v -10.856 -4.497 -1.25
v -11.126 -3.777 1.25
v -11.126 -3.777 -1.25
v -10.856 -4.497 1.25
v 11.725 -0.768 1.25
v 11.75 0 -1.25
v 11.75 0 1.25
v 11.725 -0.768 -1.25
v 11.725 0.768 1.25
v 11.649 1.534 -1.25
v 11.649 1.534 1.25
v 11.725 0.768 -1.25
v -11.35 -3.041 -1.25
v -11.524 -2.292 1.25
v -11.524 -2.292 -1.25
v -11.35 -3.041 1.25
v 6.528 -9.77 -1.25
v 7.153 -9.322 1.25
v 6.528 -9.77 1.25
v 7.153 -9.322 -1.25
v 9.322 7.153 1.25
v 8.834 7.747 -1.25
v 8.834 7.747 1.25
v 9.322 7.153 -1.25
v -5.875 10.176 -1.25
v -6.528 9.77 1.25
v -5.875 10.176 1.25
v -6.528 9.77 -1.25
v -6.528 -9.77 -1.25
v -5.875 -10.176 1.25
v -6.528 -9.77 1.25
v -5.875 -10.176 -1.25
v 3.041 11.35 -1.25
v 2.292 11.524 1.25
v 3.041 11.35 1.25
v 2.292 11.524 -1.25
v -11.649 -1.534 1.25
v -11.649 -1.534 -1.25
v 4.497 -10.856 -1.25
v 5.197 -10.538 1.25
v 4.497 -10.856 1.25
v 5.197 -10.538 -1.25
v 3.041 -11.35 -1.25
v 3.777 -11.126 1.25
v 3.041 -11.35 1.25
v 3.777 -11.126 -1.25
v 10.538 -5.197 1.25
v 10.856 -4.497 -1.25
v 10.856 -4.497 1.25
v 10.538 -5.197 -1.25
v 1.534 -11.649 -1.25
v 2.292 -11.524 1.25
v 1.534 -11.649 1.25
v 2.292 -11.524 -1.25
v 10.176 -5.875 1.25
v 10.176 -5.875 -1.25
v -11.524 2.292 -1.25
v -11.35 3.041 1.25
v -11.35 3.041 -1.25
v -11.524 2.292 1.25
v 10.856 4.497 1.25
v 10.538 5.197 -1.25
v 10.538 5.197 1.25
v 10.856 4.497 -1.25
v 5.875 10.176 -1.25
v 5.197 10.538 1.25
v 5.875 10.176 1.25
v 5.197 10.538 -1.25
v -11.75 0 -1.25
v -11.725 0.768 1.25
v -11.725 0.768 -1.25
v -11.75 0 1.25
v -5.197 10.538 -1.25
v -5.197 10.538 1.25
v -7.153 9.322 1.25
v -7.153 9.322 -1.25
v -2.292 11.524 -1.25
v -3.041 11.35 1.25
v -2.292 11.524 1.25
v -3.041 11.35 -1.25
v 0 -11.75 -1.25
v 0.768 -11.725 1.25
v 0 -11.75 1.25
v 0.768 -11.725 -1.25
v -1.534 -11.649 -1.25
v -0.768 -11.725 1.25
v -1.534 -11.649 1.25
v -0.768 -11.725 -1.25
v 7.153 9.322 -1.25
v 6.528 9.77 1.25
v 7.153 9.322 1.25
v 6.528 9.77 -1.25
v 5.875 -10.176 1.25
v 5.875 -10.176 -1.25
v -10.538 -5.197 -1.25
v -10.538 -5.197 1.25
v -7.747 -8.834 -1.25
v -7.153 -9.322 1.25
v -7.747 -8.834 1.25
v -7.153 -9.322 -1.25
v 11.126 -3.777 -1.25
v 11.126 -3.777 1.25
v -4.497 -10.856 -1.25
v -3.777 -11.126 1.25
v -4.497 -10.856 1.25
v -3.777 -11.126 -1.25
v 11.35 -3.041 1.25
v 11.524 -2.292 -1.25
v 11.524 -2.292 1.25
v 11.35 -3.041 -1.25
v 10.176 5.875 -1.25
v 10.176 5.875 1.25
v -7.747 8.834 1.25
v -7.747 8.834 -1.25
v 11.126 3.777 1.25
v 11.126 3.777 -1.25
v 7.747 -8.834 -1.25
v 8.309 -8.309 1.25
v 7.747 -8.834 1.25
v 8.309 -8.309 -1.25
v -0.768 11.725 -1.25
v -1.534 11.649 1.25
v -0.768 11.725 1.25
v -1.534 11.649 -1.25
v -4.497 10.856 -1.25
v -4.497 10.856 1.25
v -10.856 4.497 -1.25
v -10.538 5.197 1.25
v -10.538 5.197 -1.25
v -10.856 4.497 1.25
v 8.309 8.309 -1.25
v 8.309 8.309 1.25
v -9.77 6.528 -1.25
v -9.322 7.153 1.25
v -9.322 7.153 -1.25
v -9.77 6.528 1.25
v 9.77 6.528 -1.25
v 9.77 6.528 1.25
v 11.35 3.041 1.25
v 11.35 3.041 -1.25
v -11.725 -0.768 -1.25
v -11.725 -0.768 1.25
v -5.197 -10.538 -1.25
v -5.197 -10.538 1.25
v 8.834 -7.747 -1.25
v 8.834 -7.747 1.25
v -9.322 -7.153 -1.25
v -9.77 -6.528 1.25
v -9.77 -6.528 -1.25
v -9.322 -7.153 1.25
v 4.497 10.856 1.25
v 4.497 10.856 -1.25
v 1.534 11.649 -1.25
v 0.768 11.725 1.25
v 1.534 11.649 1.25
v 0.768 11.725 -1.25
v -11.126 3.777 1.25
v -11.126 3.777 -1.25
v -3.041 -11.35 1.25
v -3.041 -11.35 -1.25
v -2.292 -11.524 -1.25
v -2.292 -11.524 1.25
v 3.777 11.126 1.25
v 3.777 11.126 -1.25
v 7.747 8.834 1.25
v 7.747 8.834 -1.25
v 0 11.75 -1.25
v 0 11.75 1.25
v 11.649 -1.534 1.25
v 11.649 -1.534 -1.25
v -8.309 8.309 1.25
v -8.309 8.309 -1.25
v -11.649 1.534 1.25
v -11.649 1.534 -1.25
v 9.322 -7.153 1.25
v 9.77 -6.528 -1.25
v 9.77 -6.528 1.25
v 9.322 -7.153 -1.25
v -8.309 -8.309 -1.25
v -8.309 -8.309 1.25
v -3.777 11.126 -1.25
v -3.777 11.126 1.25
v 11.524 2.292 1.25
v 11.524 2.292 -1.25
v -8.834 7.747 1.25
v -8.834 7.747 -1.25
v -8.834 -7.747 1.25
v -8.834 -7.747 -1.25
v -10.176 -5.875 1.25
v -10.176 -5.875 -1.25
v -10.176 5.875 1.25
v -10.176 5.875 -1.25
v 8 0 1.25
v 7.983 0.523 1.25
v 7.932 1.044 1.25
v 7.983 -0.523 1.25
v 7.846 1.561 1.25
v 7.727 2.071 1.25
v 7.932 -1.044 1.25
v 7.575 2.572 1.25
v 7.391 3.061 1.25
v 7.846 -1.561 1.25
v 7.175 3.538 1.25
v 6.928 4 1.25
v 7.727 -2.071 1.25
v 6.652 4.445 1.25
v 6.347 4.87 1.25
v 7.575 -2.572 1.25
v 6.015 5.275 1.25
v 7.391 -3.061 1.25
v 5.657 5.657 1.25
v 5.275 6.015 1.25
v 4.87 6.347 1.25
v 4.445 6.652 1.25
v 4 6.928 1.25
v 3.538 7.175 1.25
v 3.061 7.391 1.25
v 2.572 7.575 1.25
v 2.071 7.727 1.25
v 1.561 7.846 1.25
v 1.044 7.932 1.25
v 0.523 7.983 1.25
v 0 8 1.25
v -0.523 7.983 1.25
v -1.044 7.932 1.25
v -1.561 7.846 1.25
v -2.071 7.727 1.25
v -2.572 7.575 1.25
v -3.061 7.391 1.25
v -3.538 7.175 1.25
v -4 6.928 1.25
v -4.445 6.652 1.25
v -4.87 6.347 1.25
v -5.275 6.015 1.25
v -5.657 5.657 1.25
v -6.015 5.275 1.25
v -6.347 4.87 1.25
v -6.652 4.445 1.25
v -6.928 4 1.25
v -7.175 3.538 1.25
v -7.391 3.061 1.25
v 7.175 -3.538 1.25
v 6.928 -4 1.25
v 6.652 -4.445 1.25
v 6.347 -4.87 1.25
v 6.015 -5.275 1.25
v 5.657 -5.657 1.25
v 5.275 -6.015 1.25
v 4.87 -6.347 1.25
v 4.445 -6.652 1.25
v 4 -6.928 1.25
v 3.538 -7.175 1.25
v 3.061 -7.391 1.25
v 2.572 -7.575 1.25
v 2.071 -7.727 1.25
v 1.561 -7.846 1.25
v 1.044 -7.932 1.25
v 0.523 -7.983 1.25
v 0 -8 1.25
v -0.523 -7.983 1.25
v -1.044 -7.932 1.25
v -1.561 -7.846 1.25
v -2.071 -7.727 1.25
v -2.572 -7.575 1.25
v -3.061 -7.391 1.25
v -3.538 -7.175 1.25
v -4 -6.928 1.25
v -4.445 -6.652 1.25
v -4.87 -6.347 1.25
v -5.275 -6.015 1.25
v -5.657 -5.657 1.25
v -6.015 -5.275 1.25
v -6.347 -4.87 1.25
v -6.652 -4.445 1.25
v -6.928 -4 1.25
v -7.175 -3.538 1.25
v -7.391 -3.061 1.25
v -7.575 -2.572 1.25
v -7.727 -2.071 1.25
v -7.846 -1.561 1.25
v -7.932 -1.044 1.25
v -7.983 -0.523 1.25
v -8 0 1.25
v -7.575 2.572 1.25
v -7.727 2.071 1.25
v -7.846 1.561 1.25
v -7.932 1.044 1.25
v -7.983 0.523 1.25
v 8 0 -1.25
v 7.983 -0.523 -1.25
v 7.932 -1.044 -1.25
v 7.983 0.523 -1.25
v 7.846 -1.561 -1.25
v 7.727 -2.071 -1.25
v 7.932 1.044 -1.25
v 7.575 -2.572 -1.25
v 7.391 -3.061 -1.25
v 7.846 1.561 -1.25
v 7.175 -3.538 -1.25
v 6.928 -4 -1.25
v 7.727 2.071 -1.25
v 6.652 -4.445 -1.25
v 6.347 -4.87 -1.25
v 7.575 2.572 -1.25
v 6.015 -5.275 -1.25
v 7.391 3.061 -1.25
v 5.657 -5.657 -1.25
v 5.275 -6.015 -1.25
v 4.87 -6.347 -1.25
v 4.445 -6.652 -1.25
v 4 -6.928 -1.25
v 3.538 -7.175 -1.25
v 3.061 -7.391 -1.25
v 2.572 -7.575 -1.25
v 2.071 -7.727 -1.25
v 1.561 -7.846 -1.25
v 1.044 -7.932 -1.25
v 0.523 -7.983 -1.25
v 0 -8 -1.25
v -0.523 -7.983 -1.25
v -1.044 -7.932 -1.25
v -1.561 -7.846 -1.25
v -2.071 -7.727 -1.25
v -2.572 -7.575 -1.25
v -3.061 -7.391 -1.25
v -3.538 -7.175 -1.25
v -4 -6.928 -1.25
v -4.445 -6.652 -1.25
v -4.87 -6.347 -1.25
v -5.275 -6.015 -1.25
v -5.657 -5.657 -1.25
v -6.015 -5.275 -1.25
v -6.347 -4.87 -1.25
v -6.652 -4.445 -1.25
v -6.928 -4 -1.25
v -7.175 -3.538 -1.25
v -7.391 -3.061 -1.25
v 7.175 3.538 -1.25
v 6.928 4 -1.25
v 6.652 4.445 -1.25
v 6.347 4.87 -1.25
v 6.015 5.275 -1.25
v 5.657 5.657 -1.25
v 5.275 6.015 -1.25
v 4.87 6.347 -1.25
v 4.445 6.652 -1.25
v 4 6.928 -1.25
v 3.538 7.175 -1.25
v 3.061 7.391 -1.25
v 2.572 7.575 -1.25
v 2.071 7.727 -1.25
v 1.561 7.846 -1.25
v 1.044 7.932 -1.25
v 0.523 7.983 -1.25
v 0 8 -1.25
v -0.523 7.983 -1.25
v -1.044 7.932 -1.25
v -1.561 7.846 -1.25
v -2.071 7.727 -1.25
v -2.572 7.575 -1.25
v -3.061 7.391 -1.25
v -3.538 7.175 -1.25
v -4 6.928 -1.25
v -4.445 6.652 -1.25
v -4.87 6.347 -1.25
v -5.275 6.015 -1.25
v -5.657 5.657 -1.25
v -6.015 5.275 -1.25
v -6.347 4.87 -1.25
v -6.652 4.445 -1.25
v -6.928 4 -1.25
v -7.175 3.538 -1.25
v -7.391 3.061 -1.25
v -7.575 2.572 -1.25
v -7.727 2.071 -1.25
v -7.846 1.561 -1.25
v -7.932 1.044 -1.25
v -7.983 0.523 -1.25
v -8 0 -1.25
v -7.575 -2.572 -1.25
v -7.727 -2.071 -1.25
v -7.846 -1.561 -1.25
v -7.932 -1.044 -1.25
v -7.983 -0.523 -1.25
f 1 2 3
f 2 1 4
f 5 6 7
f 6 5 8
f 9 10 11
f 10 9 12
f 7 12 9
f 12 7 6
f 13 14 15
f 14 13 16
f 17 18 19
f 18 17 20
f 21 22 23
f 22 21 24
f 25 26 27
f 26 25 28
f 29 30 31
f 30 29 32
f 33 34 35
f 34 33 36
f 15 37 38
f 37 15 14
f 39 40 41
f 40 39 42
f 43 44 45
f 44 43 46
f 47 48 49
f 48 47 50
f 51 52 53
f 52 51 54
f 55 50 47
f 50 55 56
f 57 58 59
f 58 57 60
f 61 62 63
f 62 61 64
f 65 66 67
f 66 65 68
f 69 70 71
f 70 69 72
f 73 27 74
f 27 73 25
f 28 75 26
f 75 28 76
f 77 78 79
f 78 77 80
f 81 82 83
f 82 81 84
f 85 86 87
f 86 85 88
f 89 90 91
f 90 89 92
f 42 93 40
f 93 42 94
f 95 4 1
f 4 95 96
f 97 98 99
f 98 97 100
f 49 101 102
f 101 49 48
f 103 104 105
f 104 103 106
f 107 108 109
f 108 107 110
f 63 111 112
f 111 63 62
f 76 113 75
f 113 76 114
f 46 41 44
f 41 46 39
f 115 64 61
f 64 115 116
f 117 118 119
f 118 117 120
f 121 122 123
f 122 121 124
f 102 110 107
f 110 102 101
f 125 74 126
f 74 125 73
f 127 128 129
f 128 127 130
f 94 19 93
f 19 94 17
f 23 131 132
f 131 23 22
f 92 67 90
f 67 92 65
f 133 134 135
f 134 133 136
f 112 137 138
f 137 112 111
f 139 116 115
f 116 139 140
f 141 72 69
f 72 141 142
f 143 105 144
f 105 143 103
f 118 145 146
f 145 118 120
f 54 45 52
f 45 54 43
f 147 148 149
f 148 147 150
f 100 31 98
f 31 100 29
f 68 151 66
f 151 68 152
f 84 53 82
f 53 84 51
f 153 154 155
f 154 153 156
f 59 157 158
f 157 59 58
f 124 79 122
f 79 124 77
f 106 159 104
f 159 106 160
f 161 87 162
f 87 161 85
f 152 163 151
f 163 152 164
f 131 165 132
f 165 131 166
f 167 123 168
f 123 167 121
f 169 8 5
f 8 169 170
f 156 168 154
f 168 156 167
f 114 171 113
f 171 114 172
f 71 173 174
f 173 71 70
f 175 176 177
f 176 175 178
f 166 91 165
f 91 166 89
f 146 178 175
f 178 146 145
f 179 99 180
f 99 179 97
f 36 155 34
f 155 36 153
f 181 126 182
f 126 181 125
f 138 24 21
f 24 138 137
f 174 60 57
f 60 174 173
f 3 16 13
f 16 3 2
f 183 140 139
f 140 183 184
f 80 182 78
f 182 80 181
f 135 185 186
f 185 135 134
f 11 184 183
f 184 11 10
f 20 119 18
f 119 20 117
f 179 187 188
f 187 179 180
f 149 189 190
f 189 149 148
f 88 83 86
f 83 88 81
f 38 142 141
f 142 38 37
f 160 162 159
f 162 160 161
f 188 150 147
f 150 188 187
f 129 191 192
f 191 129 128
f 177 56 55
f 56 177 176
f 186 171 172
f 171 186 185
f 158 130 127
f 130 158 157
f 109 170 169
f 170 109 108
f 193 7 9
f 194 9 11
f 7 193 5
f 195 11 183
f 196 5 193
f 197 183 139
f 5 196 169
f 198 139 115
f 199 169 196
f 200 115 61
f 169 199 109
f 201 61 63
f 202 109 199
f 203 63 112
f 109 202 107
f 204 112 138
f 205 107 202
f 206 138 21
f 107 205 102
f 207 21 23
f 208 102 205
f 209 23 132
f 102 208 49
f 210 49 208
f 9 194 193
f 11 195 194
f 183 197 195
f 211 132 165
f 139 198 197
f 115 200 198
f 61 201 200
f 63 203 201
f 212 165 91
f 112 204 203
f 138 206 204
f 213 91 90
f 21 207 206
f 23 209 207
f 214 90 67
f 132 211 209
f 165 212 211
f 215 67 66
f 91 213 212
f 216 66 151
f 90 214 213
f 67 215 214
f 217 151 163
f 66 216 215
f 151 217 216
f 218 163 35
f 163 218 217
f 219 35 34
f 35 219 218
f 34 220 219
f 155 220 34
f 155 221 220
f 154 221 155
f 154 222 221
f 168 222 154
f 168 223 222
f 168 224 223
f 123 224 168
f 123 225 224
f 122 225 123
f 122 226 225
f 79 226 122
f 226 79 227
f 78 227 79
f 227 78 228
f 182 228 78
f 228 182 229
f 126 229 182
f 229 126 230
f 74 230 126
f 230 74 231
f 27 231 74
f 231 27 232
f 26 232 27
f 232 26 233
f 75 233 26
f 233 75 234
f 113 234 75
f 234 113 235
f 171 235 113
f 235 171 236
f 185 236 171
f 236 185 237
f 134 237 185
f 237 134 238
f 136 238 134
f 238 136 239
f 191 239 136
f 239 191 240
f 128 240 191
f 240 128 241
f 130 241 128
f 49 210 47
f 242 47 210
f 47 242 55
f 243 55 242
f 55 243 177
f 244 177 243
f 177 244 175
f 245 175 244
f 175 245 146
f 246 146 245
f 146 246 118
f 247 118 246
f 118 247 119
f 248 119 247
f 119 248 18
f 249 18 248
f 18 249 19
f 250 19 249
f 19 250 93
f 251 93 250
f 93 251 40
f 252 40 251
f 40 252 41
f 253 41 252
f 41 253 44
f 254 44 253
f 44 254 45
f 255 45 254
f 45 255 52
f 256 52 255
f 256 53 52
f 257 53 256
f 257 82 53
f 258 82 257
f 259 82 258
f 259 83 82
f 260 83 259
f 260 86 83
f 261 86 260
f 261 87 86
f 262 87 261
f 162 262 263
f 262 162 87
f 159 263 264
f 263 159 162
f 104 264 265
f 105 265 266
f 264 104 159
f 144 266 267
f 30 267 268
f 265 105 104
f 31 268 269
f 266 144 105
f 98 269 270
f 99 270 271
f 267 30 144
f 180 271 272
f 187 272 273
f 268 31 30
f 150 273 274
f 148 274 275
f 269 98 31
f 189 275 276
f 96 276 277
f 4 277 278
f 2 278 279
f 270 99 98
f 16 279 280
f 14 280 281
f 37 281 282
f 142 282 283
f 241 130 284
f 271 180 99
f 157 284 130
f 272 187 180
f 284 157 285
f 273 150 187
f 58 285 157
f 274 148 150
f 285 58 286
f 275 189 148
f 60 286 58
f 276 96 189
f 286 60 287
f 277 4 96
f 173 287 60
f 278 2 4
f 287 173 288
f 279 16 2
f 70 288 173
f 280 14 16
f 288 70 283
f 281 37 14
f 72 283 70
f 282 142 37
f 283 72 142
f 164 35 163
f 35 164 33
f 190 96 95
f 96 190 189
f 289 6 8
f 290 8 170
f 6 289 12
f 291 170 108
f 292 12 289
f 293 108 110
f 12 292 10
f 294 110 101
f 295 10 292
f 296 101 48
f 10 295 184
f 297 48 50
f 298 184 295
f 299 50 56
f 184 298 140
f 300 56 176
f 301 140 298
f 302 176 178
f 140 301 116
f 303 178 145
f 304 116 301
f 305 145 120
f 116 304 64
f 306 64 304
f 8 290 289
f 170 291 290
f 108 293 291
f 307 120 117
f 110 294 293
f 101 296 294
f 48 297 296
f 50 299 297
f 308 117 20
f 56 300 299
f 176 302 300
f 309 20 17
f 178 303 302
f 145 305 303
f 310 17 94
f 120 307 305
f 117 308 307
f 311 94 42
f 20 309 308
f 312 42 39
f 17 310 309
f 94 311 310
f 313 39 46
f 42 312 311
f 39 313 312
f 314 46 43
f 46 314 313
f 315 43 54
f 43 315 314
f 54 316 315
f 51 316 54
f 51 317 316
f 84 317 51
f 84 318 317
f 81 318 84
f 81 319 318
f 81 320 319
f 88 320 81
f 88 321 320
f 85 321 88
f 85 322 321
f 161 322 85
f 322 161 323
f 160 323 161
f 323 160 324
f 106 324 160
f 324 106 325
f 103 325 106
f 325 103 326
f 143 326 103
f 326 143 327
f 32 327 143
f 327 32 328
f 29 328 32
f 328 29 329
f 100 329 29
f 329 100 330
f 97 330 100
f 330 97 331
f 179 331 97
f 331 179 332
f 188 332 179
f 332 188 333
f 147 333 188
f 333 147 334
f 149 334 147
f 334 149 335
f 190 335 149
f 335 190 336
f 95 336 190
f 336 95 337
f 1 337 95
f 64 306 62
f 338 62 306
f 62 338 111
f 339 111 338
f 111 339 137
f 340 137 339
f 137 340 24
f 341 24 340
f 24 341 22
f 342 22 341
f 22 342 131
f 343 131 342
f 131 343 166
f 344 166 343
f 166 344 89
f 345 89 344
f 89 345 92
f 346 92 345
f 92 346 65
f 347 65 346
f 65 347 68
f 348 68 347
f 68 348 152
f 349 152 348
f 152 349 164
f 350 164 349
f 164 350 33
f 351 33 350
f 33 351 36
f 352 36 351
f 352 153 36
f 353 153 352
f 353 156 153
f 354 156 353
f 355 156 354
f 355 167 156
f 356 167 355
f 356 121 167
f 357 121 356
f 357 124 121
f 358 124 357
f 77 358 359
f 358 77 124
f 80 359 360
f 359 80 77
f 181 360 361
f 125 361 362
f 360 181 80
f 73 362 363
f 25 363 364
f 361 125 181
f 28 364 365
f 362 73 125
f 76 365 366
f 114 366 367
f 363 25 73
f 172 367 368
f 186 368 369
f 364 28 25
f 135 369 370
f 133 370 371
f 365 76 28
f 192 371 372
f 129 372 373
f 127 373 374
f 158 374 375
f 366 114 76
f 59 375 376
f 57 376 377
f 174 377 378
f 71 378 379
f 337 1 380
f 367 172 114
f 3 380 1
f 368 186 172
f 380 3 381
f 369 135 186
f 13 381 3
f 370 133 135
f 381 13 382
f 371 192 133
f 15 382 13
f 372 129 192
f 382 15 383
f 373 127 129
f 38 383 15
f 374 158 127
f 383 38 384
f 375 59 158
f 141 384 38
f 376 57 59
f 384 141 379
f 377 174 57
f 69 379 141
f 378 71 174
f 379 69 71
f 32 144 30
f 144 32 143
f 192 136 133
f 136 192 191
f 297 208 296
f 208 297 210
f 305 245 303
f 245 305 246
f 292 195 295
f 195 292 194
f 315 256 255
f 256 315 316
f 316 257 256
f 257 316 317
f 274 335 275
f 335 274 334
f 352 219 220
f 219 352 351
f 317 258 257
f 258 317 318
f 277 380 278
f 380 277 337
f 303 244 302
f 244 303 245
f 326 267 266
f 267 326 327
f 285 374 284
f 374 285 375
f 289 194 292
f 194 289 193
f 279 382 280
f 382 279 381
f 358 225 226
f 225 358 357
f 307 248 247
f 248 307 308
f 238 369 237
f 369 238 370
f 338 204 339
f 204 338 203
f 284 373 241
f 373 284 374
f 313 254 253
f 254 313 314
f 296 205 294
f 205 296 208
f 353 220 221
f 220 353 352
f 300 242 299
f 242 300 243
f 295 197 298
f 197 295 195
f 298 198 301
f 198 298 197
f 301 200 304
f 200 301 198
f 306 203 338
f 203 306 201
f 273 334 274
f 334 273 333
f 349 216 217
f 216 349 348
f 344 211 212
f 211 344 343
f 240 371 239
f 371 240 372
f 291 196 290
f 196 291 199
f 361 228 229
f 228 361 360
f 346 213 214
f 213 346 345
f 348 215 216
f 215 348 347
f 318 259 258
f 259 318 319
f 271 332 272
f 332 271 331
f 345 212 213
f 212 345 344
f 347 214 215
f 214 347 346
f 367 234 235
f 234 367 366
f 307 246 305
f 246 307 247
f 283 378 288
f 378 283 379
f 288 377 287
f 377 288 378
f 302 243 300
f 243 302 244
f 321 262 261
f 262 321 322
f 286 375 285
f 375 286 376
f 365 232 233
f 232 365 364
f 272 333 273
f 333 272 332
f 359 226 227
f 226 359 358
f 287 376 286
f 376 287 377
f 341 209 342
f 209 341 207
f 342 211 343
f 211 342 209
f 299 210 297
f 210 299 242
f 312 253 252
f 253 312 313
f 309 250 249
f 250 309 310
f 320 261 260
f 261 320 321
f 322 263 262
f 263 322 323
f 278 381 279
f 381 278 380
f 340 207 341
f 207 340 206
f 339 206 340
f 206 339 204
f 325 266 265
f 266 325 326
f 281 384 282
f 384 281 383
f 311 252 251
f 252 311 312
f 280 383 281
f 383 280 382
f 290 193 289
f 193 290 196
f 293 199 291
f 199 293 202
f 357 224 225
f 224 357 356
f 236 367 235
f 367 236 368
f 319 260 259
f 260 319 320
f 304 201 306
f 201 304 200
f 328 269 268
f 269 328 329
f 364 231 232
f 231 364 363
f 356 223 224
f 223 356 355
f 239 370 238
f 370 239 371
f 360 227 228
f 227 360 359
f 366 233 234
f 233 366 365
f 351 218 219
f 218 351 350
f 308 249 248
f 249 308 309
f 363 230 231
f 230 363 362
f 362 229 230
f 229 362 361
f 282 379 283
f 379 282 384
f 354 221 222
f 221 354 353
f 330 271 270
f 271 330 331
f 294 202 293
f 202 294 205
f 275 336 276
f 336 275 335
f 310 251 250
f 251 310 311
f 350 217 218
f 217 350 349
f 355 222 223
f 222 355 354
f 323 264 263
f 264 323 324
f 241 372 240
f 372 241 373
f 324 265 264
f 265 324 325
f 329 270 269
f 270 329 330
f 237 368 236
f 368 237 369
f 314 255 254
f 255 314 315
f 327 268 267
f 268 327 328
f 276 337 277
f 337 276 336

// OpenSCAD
// dichtung
// 05.06.2026 Sebastian Weigl
$fn = 96;
difference() {
// main body
  translate([0,0,0])
  cylinder(h=2.5,d=23.5,center=true);
// inner body
  translate([0,0,0])
  cylinder(h=2.5,d=16,center=true);
}
